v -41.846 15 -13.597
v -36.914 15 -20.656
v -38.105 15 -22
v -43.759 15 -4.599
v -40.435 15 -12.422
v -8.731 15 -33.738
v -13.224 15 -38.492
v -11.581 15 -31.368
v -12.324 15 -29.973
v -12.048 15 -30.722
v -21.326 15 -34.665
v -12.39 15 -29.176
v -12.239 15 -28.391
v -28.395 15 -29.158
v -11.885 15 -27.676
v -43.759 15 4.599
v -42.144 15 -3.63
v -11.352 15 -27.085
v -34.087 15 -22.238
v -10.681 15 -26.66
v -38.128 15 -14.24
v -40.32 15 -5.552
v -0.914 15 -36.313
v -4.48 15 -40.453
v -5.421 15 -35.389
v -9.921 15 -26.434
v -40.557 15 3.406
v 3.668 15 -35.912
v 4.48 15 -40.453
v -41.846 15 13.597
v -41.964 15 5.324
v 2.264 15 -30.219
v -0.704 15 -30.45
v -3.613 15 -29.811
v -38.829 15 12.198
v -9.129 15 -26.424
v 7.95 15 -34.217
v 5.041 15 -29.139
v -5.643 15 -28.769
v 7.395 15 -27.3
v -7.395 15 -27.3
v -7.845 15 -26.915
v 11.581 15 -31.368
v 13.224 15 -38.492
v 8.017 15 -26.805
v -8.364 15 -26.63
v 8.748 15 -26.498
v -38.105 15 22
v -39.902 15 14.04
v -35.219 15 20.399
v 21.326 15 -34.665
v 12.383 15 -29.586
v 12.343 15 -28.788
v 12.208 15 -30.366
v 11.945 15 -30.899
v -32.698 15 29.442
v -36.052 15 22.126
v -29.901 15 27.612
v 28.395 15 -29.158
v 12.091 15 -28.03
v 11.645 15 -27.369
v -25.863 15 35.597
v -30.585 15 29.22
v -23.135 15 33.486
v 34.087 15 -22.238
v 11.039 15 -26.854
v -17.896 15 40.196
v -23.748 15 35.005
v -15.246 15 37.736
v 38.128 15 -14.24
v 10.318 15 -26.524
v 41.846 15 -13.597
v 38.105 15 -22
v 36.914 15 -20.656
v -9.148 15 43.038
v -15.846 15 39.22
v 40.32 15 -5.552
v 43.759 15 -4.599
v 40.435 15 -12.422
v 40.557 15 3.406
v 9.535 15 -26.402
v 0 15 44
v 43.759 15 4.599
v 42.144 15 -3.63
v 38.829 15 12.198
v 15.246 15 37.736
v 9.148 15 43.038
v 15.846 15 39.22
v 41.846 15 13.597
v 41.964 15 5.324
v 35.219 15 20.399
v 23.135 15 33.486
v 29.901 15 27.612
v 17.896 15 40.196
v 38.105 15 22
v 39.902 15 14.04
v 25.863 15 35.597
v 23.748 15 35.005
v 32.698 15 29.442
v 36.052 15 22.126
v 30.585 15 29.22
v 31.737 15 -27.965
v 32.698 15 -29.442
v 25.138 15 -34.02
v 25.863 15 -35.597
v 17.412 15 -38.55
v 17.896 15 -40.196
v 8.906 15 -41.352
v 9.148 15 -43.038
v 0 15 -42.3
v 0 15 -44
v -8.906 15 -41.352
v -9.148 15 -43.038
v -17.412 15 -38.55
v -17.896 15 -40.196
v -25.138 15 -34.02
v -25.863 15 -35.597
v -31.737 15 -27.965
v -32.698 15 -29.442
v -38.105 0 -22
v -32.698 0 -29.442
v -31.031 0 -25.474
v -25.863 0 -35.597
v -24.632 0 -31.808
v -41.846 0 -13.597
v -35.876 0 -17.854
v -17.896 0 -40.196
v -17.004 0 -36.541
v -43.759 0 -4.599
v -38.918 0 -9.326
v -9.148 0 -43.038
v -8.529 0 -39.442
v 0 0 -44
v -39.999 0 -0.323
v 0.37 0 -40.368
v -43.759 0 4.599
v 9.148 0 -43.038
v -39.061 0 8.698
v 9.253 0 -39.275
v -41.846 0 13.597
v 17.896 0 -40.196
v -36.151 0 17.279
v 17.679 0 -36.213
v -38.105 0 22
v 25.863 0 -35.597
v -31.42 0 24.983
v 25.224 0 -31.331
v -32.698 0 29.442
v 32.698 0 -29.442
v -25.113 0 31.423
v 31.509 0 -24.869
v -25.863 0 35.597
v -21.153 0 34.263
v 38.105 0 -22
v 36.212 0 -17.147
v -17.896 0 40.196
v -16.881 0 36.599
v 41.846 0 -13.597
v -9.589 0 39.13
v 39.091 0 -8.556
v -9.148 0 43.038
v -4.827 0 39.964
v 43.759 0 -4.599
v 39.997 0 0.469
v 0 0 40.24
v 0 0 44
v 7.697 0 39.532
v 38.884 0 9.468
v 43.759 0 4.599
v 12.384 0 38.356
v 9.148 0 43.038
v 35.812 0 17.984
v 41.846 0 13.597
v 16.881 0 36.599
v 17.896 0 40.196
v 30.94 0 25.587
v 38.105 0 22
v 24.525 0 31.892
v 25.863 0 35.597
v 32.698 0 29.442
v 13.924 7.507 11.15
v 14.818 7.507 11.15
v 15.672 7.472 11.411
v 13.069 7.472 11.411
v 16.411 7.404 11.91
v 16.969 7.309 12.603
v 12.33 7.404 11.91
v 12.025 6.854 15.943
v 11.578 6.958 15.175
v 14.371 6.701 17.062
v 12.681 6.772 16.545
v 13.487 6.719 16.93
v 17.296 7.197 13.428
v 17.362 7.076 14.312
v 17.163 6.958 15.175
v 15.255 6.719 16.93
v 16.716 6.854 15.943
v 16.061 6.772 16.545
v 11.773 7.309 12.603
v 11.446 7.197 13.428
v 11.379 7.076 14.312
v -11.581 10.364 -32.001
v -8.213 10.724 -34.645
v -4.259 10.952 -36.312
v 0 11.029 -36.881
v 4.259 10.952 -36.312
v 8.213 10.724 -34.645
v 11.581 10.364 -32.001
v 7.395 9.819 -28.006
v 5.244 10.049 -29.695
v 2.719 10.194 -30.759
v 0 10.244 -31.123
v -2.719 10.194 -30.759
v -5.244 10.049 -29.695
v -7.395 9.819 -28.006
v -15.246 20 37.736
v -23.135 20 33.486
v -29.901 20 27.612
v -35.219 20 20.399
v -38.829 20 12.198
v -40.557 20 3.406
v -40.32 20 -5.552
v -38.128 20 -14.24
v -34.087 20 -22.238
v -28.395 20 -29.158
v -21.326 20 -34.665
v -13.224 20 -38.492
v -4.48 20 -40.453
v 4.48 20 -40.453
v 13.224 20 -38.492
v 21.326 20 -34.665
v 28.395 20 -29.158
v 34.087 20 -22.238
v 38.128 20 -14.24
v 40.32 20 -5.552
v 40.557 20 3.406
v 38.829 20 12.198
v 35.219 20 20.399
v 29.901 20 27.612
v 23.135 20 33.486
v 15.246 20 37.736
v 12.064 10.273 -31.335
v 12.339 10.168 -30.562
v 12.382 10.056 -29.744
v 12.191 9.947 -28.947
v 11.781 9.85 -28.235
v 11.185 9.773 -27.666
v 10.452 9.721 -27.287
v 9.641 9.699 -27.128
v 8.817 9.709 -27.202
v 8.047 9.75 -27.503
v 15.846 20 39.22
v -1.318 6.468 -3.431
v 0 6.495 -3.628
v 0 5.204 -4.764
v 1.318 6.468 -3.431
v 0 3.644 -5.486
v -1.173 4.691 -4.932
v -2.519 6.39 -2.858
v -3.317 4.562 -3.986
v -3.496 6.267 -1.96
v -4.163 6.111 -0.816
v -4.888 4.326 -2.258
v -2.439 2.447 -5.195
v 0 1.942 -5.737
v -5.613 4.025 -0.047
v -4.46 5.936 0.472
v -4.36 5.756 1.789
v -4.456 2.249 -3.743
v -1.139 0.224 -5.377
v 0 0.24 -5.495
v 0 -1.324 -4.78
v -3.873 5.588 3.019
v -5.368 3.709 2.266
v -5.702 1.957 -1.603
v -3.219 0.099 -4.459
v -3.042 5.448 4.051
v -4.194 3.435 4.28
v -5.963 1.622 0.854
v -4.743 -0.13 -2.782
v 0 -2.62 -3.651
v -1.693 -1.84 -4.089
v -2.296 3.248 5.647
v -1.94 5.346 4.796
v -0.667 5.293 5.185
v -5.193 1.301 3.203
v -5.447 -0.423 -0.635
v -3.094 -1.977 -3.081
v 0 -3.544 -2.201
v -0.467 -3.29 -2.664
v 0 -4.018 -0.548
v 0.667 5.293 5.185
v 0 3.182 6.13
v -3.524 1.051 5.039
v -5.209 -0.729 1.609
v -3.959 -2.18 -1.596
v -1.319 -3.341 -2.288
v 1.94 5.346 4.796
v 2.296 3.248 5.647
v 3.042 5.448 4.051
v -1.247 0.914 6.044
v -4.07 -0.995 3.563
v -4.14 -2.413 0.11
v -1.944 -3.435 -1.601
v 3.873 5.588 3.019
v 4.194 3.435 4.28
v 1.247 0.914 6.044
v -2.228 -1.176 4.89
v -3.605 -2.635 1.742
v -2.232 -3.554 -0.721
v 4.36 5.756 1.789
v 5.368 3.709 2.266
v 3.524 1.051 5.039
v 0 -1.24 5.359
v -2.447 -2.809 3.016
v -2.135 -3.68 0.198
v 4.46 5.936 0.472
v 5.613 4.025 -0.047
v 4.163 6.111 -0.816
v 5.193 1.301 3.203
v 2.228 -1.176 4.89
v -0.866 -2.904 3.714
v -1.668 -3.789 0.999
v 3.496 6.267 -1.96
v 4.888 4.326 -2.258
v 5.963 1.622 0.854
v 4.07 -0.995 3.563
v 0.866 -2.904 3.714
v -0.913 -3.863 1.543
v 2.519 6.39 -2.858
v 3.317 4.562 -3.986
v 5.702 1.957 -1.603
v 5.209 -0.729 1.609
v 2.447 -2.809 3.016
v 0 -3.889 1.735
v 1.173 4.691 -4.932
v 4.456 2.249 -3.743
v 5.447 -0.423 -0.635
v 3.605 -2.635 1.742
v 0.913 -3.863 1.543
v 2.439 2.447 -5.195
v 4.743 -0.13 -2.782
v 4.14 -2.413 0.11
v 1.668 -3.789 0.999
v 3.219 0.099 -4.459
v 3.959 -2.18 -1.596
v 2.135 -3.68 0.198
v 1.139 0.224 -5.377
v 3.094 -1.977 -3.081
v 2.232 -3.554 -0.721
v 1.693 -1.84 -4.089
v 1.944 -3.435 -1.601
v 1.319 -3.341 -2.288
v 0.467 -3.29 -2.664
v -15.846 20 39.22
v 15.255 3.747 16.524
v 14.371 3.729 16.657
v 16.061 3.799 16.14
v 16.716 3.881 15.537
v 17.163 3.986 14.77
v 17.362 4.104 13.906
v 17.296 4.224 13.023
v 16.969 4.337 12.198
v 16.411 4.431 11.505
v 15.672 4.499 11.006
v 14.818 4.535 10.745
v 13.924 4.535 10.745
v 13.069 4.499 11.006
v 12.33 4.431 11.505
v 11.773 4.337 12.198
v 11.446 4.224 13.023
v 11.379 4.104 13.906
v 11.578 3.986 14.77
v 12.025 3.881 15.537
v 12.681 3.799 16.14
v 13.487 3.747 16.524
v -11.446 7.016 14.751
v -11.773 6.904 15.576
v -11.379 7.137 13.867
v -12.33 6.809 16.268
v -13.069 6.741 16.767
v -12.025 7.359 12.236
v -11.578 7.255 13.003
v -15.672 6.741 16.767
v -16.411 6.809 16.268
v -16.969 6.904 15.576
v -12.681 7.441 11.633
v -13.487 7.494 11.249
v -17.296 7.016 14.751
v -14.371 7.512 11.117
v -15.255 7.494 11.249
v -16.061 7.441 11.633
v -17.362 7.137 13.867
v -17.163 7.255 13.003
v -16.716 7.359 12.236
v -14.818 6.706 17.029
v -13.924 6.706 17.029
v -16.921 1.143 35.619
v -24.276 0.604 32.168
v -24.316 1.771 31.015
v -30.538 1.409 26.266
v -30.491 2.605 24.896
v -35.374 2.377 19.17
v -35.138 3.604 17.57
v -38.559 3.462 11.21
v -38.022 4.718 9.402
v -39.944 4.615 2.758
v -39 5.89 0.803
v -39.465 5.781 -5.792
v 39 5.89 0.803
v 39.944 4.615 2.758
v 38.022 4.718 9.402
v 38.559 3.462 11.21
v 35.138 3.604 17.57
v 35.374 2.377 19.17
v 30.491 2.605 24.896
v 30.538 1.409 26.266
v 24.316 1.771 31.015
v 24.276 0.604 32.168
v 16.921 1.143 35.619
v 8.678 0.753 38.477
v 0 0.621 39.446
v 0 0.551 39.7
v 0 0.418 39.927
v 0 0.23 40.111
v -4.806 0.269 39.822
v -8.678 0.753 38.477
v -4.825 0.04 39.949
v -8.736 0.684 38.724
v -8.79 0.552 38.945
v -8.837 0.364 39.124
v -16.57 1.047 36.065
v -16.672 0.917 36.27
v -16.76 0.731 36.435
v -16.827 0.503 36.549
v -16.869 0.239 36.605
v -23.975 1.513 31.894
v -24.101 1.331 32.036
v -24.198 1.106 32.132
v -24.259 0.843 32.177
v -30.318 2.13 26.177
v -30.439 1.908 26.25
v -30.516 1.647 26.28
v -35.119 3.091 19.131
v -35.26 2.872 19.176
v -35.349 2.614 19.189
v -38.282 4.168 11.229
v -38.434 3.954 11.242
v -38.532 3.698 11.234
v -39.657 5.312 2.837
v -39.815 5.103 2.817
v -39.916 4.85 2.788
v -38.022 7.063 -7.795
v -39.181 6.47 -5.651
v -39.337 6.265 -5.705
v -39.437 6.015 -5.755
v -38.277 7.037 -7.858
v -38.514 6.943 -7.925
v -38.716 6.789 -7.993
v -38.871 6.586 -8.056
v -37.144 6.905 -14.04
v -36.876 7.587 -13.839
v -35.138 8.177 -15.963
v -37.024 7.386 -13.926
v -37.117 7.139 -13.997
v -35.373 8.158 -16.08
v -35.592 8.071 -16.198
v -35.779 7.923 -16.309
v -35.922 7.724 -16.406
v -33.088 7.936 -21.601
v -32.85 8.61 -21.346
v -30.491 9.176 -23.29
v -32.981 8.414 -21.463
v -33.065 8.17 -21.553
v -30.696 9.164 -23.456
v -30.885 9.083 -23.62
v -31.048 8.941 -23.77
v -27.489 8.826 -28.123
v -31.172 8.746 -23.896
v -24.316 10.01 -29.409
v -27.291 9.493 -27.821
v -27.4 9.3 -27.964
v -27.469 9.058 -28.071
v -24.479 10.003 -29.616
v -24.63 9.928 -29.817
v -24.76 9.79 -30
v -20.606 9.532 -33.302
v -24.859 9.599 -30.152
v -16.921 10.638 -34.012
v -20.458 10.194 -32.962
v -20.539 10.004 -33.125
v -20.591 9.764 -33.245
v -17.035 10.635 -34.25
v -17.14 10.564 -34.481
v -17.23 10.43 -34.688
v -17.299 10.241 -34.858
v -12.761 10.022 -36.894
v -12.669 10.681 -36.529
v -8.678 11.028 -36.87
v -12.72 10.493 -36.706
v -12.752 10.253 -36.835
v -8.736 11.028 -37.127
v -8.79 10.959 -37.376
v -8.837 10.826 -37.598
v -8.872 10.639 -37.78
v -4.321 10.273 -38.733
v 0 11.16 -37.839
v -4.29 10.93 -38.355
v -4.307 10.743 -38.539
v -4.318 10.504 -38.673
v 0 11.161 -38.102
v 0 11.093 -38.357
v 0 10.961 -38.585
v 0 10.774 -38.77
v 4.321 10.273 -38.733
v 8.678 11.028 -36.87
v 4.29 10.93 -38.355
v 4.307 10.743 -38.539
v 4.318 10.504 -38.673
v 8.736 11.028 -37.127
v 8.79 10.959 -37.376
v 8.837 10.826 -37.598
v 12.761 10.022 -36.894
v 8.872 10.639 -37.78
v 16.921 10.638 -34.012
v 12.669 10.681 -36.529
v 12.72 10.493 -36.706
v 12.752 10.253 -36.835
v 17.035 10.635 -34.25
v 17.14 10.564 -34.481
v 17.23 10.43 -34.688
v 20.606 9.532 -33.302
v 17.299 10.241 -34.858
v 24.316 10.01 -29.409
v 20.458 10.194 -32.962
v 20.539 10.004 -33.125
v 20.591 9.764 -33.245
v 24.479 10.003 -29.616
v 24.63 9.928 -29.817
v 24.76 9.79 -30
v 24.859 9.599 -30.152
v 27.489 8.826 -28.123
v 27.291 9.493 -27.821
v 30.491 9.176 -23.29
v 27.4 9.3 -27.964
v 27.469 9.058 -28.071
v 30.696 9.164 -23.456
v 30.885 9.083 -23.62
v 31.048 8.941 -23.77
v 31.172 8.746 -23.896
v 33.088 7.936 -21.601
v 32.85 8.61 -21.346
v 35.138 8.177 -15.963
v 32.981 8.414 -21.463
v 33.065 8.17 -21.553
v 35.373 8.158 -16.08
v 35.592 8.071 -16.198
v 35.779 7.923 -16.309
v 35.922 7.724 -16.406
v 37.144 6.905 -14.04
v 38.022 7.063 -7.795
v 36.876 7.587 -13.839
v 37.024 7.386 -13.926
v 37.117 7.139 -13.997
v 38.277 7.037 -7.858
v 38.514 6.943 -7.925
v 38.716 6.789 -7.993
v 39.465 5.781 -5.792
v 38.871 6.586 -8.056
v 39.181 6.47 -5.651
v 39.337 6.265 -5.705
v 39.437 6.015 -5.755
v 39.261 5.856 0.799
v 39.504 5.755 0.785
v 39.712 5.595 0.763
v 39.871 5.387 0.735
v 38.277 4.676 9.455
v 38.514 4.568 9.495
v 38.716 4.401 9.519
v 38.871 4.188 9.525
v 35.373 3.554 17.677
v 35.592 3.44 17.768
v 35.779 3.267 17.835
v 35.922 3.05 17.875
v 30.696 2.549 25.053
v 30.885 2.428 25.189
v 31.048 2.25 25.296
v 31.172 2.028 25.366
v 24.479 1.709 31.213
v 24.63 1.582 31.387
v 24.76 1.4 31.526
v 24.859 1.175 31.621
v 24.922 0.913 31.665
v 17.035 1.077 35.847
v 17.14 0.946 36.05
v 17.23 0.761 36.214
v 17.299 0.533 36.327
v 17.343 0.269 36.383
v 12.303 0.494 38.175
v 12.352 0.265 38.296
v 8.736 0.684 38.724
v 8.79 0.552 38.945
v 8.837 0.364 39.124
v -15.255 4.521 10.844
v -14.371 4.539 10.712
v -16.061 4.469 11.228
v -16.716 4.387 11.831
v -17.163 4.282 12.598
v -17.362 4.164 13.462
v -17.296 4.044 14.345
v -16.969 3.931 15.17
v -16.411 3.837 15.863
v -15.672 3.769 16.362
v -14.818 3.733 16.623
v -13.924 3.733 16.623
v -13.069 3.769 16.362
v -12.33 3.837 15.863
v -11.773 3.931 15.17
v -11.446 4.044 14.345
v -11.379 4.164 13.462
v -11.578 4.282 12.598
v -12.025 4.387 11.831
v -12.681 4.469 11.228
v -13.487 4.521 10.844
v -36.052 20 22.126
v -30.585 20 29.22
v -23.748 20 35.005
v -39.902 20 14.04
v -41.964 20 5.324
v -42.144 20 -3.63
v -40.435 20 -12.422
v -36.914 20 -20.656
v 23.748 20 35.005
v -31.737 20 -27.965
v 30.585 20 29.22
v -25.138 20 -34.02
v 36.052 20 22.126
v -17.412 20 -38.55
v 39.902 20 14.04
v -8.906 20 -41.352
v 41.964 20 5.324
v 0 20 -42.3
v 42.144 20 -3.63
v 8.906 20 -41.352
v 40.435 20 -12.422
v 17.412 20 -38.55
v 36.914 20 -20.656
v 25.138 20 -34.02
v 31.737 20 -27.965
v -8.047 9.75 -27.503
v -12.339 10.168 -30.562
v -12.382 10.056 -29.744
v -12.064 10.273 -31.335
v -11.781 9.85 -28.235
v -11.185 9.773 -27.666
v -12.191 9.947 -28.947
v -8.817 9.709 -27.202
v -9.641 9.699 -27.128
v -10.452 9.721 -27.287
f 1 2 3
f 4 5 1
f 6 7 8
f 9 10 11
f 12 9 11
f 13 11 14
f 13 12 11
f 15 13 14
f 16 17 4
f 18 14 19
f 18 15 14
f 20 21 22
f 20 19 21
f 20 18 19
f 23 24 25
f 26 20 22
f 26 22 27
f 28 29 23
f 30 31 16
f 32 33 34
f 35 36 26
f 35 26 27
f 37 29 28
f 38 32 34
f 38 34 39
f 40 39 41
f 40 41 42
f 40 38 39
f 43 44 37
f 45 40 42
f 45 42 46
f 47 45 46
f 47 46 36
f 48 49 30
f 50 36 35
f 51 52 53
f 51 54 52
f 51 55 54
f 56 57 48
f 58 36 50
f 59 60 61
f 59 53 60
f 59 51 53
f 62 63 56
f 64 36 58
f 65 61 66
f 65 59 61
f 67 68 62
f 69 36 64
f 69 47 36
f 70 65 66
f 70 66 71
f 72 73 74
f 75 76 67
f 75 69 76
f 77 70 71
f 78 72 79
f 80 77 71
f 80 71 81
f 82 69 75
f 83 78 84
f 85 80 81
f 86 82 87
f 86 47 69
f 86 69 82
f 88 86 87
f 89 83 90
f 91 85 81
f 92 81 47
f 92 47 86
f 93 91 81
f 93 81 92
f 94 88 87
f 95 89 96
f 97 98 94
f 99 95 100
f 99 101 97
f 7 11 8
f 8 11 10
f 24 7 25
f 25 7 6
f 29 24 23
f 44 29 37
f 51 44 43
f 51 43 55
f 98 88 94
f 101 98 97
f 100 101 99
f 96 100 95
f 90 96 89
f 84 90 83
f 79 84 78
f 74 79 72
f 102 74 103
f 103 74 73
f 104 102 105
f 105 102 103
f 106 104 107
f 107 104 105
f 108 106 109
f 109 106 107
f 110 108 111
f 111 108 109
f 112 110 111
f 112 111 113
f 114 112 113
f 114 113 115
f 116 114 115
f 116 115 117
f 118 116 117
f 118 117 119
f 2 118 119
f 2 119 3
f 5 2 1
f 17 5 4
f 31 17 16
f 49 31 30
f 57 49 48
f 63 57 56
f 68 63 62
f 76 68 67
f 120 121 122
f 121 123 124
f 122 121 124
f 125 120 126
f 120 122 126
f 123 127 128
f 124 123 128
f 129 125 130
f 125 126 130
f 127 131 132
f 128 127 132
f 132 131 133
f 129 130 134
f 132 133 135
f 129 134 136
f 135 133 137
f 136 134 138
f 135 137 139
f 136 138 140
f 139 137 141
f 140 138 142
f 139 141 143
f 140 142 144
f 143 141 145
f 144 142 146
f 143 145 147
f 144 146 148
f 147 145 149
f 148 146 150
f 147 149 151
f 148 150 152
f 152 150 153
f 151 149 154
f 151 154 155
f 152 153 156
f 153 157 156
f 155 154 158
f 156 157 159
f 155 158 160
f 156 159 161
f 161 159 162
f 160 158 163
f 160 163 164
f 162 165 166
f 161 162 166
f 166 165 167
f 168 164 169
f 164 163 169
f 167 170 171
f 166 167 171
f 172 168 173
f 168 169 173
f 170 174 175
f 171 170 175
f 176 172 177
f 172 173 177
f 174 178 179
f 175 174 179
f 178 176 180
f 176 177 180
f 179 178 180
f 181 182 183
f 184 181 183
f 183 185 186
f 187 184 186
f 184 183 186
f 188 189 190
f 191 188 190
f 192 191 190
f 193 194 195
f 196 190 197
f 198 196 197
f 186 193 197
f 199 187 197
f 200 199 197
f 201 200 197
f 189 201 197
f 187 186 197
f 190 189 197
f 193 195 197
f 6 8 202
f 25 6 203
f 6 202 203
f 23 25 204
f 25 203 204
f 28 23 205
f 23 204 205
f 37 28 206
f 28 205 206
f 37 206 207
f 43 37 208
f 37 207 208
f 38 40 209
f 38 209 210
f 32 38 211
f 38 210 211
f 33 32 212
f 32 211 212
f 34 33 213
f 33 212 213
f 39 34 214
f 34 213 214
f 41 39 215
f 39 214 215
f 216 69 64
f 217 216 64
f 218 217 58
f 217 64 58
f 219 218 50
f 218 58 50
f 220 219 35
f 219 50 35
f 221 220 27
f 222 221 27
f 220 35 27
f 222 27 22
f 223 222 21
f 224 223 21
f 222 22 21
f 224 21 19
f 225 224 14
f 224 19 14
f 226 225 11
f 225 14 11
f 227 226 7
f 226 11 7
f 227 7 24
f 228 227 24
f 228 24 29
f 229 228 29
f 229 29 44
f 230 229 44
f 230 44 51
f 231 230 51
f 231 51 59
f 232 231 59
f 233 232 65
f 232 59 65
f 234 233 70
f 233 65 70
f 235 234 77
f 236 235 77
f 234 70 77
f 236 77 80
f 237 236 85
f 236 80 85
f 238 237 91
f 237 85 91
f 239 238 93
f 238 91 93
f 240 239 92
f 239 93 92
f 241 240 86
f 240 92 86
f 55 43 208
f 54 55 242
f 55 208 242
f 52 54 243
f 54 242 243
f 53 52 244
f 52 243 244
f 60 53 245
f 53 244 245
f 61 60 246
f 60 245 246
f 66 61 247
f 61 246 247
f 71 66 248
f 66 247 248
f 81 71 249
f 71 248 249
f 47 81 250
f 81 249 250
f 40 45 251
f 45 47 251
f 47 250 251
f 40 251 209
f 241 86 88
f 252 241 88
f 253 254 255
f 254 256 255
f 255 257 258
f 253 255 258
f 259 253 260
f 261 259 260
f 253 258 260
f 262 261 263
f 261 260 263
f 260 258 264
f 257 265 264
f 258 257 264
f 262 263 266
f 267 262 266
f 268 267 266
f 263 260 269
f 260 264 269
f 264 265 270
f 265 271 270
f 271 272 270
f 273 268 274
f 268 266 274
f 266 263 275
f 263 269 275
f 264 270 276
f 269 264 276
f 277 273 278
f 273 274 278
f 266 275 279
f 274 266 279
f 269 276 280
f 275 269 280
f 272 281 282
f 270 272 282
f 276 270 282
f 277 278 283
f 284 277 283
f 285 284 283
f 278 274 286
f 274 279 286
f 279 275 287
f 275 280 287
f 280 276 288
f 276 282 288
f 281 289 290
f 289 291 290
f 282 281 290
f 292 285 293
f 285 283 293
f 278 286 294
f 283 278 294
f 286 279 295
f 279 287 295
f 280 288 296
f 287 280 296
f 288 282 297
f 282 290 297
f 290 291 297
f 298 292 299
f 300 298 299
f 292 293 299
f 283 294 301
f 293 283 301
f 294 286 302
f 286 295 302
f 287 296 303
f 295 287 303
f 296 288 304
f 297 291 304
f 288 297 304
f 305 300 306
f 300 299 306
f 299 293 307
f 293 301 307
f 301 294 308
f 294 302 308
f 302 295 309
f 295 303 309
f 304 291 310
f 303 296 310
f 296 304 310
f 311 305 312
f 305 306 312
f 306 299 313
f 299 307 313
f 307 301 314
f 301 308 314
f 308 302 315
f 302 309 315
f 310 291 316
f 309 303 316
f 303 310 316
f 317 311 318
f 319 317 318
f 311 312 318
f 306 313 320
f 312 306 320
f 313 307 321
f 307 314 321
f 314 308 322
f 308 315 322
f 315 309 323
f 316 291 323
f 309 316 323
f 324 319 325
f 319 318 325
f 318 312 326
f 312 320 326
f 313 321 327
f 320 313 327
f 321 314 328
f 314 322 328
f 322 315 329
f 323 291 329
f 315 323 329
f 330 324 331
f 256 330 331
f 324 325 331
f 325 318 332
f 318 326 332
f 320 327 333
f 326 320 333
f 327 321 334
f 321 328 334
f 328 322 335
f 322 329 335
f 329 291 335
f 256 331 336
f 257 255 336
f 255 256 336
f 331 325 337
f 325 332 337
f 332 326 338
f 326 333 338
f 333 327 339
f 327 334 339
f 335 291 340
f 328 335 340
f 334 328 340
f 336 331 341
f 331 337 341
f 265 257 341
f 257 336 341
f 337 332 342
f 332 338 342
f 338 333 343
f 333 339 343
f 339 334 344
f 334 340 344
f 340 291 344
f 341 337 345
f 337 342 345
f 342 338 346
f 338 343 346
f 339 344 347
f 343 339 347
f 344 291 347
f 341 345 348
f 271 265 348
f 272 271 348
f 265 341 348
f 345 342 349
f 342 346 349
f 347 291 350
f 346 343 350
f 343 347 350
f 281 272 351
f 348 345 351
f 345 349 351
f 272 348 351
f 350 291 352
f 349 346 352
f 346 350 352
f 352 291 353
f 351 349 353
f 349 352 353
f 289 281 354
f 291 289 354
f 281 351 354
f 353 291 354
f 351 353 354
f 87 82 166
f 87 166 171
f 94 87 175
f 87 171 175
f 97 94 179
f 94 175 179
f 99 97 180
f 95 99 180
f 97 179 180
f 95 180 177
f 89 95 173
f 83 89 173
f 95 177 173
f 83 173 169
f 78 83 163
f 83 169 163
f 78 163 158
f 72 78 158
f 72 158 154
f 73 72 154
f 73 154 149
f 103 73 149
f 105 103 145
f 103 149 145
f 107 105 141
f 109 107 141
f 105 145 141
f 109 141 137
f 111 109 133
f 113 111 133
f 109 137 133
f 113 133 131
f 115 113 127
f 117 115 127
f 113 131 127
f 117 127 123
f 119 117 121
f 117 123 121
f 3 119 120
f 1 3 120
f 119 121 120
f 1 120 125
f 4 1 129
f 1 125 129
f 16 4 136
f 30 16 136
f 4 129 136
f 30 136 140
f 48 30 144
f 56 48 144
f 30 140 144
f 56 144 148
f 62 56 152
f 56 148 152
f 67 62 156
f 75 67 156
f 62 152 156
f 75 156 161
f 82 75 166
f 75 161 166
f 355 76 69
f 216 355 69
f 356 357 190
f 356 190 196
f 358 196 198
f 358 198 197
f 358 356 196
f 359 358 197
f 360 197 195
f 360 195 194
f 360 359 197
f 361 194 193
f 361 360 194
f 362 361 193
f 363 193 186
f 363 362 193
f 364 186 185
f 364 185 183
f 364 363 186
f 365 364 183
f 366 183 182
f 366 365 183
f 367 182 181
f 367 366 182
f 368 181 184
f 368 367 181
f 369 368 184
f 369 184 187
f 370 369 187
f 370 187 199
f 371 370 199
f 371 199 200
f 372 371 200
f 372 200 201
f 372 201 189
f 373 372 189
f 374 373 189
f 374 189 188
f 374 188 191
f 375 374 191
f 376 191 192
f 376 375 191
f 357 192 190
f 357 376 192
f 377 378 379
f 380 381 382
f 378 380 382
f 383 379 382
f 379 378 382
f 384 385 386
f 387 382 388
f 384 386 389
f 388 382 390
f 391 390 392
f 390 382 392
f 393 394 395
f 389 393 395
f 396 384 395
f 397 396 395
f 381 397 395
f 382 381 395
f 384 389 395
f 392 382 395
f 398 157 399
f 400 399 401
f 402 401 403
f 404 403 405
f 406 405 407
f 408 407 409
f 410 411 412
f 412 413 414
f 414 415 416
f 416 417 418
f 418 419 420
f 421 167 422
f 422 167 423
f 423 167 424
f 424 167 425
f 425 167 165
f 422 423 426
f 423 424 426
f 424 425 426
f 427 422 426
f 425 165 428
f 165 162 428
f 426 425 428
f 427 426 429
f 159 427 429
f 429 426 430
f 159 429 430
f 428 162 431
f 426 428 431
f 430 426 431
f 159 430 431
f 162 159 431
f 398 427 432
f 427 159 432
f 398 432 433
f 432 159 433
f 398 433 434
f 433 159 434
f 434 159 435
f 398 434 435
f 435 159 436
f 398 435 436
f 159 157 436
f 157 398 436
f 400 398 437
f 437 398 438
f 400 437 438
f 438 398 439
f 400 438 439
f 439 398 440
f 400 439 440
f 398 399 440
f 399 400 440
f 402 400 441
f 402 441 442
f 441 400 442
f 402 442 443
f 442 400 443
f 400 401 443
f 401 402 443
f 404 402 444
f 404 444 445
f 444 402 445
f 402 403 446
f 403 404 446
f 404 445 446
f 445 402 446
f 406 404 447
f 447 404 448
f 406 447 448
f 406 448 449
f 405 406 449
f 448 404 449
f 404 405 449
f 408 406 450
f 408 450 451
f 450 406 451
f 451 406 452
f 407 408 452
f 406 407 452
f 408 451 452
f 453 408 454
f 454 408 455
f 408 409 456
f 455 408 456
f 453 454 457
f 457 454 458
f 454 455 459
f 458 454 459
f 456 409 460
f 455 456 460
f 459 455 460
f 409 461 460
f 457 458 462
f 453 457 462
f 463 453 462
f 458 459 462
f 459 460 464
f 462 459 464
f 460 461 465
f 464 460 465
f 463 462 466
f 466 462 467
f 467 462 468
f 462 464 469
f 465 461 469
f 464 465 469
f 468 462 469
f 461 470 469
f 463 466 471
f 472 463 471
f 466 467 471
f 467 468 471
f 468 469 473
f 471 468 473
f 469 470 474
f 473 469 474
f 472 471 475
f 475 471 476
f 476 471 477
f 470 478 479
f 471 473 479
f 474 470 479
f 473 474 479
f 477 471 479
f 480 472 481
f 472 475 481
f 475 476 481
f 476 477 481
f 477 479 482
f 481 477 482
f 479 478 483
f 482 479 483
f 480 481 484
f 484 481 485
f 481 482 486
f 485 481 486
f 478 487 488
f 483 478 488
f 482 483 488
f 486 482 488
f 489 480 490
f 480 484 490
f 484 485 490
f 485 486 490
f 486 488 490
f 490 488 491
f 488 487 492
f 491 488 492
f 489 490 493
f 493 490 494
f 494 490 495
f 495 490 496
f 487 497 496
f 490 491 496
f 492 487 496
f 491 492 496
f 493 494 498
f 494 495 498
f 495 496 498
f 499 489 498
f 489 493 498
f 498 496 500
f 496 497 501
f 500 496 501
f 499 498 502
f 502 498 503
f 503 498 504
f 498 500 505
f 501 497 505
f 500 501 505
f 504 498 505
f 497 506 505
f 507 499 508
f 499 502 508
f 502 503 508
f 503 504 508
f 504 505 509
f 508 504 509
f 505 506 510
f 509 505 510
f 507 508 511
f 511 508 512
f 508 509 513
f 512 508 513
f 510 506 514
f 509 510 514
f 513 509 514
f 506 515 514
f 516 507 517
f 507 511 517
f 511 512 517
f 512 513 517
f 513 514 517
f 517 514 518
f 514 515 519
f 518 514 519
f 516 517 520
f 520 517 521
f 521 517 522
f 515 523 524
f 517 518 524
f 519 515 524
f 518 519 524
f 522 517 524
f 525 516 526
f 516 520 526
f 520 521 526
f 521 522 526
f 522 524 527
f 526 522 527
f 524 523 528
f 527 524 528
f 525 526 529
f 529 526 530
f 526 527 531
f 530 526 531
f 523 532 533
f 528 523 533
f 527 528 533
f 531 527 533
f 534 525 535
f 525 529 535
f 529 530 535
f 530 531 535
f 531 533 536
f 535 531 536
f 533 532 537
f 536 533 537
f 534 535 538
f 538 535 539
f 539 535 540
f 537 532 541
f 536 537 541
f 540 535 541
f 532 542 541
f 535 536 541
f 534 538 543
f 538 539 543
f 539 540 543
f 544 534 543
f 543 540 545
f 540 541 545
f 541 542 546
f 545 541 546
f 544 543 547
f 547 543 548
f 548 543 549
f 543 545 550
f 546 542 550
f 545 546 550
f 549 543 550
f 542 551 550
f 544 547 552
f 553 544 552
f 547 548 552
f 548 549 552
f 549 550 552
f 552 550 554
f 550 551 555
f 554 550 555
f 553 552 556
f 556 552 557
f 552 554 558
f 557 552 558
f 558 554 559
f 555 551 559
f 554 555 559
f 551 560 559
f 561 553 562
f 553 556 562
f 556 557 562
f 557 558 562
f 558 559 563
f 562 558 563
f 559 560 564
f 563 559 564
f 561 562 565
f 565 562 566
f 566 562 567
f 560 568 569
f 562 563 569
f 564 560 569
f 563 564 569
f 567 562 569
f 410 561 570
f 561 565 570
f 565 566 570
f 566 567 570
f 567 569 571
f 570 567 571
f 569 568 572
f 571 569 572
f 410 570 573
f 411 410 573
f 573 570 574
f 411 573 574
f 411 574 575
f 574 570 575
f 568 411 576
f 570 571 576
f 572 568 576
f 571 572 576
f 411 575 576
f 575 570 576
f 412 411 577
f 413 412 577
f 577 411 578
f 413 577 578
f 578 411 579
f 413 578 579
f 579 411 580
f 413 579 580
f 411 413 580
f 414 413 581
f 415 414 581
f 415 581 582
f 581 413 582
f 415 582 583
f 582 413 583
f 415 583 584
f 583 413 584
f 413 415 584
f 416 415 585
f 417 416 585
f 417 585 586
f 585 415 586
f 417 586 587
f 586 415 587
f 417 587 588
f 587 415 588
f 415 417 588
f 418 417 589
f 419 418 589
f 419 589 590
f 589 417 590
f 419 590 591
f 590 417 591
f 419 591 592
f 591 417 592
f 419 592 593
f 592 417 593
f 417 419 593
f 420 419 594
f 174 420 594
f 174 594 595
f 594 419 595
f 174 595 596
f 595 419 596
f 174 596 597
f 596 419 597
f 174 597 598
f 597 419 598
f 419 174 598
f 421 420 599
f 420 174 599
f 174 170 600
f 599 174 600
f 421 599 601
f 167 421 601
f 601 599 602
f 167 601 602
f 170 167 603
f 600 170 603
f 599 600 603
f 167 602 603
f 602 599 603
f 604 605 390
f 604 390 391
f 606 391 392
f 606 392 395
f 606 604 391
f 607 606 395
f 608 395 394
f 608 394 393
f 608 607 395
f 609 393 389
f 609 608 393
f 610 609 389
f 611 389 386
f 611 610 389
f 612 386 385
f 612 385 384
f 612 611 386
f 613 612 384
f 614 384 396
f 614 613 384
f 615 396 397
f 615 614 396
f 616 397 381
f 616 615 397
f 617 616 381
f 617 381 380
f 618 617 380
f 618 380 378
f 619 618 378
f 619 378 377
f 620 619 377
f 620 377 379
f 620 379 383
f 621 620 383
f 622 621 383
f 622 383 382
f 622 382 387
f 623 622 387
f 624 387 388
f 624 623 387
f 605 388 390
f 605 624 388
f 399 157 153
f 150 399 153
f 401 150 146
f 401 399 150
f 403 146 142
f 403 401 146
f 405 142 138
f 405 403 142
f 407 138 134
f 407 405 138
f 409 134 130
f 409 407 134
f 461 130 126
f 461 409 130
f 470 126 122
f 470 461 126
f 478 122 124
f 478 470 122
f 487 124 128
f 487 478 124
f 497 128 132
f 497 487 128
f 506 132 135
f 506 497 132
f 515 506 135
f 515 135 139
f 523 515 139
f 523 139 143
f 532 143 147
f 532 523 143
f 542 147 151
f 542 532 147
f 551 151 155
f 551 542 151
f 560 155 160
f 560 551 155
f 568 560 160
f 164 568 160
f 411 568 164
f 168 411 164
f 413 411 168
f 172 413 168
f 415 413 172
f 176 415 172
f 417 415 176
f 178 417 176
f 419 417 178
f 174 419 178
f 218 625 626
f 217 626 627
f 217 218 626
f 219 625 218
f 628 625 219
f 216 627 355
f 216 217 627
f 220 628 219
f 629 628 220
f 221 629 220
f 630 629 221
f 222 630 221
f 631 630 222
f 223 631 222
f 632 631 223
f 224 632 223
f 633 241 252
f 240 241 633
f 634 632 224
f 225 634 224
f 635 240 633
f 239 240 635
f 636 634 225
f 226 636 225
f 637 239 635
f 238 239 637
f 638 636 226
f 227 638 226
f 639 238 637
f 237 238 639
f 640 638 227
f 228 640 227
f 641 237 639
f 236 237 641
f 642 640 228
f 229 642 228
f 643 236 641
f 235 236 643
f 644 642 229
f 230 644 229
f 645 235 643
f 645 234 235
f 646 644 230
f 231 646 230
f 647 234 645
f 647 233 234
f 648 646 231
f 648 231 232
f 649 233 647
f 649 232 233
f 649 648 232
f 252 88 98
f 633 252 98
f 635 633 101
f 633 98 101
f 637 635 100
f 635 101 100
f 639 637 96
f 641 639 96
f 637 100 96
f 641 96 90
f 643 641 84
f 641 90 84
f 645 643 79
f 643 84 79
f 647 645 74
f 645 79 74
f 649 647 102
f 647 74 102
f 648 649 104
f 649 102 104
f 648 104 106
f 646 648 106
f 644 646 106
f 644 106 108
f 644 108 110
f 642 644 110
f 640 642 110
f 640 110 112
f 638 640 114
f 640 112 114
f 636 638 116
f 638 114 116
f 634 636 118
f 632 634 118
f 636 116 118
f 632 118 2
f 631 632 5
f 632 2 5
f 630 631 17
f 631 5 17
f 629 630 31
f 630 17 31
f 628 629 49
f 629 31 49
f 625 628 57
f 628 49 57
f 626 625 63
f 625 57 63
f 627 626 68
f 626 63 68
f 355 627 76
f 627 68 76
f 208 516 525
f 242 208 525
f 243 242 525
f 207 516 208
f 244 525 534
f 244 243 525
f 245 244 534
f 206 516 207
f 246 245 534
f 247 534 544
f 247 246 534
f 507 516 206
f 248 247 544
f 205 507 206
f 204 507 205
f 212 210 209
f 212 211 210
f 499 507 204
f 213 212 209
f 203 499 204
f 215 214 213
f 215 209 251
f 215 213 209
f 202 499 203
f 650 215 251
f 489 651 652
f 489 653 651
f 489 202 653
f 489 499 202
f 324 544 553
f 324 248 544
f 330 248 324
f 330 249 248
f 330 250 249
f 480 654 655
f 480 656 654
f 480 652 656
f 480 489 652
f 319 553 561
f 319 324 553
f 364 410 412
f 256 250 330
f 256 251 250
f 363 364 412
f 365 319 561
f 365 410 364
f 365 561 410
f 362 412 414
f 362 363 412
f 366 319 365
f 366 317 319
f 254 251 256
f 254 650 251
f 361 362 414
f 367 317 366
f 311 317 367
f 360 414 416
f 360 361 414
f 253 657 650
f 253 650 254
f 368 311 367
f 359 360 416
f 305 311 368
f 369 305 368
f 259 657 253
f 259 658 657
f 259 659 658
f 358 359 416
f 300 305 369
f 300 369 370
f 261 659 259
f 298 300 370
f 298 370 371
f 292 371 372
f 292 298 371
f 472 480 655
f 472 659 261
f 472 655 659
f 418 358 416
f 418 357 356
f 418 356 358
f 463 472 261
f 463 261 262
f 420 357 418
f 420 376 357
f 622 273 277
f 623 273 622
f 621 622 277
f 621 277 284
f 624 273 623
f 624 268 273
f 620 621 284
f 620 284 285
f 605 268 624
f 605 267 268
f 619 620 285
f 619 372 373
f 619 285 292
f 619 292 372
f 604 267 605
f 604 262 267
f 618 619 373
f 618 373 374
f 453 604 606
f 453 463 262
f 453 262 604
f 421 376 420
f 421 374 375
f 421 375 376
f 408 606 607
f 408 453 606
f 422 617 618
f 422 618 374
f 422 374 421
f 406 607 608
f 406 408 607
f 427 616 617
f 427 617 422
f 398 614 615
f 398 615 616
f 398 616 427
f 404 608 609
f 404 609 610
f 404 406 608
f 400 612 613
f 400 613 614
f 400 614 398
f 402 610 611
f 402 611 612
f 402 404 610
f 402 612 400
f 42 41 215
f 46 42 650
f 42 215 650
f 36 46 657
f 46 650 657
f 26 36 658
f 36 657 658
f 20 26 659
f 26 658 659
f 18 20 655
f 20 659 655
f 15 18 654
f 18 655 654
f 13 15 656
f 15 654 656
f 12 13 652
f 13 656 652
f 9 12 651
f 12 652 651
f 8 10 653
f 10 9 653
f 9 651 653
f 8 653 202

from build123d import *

# Parameters (mm, degrees)
SKETCH1_R           = 44
BOSS_EXTRUDE1_DEPTH = 15
BOSS_EXTRUDE2_DEPTH = 5
SKETCH5_R           = 40
CUT_EXTRUDE1_DEPTH  = 20
CUT_EXTRUDE2_DEPTH  = 10
SKETCH7_R           = 3
CUT_EXTRUDE3_DEPTH  = 3
FILLET4_R           = 1


with BuildPart() as part:
    # Sketch1 → Boss-Extrude1 (new body)
    with BuildSketch(Plane(origin=(0, 0, 0), x_dir=(1, 0, 0), z_dir=(0, 1, 0))):
        with Locations(Location((0, 0, 0), (0, 0, 270))):
            Circle(SKETCH1_R)
    extrude(amount=BOSS_EXTRUDE1_DEPTH)

    # Sketch2 → Boss-Extrude2 (add)
    with BuildSketch(Plane(origin=(0, 15, 0), x_dir=(1, 0, 0), z_dir=(0, 1, 0))):
        with BuildLine():
            Line((15.246488352, -37.736382881), (15.845858901, -39.219877048))
            ThreePointArc((15.845858901, -39.219877048), (0, 42.3), (-15.845858901, -39.219877048))
            Line((-15.845858901, -39.219877048), (-15.246488352, -37.736382881))
            ThreePointArc((-15.246488352, -37.736382881), (0, 40.7), (15.246488352, -37.736382881))
        make_face()
    extrude(amount=BOSS_EXTRUDE2_DEPTH)

    # Sketch5 → Cut-Extrude1 (cut)
    with BuildSketch(Plane(origin=(0, 5.890466531, 0.803245436), x_dir=(-1, 0, 0), z_dir=(0, -0.990830168044299, -0.13511320473331362))):
        with Locations(Location((0, 0, 0), (0, 0, 270))):
            Circle(SKETCH5_R)
    extrude(amount=CUT_EXTRUDE1_DEPTH, mode=Mode.SUBTRACT)

    # Sketch6 → Cut-Extrude2 (cut)
    with BuildSketch(Plane(origin=(0, 5.890466531, 0.803245436), x_dir=(1, 0, 0), z_dir=(0, -0.990830168044299, -0.13511320473331365))):
        with BuildLine():
            ThreePointArc((-11.581105416, -33.107376853), (0, -38.033026978), (11.581105416, -33.107376853))
            ThreePointArc((11.581105416, -33.107376853), (11.503519007, -28.998721657), (7.39486381, -29.076308066))
            ThreePointArc((7.39486381, -29.076308066), (0, -32.221475176), (-7.39486381, -29.076308066))
            ThreePointArc((-7.39486381, -29.076308066), (-11.503519007, -28.998721657), (-11.581105416, -33.107376853))
        make_face()
    extrude(amount=-CUT_EXTRUDE2_DEPTH, mode=Mode.SUBTRACT)

    # Sketch7 → Cut-Extrude3 (cut)
    with BuildSketch(Plane(origin=(0, 6.082528488, -0.605208909), x_dir=(1, 0, 0), z_dir=(0, 0.990830168044299, 0.13511320473331365))):
        with Locations(Location((14.370787869, -14.421489162, 0), (0, 0, 270))):
            Circle(SKETCH7_R)
        with Locations(Location((-14.370787869, -14.421489162, 0), (0, 0, 90))):
            Circle(SKETCH7_R)
    extrude(amount=CUT_EXTRUDE3_DEPTH, mode=Mode.SUBTRACT)

    # Fillet4
    # the kernel refuses this fillet: 1 mm, written as the material it adds along each edge
    with BuildSketch(Plane(origin=(0, 5.890466531, 0.803245436), x_dir=(0, -0.13511320473331362, 0.9908301680442989), z_dir=(1, 0, 0))) as fillet4_piece_1_section:
        with BuildLine():
            CenterArc((40 - FILLET4_R, FILLET4_R), FILLET4_R, 270, 90)
            Line((40 - FILLET4_R, 0), (40, 0))
            Line((40, 0), (40, FILLET4_R))
        make_face()
    fillet4_piece_1 = revolve(axis=Axis((0, 5.890466531, 0.803245436), (0, -0.990830168044299, -0.13511320473331362)), mode=Mode.PRIVATE)
    fillet4_piece_1 = split(fillet4_piece_1, bisect_by=Plane(origin=(0, 0, -38.603422622), z_dir=(0, 1, 0)), keep=Keep.TOP, mode=Mode.PRIVATE)
    add(fillet4_piece_1)

    # Sketch9 → Revolve4 (revolve)
    with BuildSketch(Plane(origin=(0, 0, 0), x_dir=(1, 0, 0), z_dir=(0, 0.13511320473331362, -0.990830168044299)), mode=Mode.PRIVATE) as revolve4_sk:
        with BuildLine():
            Line((0, 4.055018992), (0, -5.944981008))
            Line((0, -5.944981008), (4.472135955, -5.944981008))
            ThreePointArc((4.472135955, -5.944981008), (5.477225575, 0.504508735), (0, 4.055018992))
        make_face()
    revolve(revolve4_sk.sketch.rotate(Axis((0, -4.017835149, -0.547886611), (0, 0.9908301680442989, 0.1351132047333136)), 90), axis=Axis((0, -4.017835149, -0.547886611), (0, 0.9908301680442989, 0.1351132047333136)))


solid = part.part
